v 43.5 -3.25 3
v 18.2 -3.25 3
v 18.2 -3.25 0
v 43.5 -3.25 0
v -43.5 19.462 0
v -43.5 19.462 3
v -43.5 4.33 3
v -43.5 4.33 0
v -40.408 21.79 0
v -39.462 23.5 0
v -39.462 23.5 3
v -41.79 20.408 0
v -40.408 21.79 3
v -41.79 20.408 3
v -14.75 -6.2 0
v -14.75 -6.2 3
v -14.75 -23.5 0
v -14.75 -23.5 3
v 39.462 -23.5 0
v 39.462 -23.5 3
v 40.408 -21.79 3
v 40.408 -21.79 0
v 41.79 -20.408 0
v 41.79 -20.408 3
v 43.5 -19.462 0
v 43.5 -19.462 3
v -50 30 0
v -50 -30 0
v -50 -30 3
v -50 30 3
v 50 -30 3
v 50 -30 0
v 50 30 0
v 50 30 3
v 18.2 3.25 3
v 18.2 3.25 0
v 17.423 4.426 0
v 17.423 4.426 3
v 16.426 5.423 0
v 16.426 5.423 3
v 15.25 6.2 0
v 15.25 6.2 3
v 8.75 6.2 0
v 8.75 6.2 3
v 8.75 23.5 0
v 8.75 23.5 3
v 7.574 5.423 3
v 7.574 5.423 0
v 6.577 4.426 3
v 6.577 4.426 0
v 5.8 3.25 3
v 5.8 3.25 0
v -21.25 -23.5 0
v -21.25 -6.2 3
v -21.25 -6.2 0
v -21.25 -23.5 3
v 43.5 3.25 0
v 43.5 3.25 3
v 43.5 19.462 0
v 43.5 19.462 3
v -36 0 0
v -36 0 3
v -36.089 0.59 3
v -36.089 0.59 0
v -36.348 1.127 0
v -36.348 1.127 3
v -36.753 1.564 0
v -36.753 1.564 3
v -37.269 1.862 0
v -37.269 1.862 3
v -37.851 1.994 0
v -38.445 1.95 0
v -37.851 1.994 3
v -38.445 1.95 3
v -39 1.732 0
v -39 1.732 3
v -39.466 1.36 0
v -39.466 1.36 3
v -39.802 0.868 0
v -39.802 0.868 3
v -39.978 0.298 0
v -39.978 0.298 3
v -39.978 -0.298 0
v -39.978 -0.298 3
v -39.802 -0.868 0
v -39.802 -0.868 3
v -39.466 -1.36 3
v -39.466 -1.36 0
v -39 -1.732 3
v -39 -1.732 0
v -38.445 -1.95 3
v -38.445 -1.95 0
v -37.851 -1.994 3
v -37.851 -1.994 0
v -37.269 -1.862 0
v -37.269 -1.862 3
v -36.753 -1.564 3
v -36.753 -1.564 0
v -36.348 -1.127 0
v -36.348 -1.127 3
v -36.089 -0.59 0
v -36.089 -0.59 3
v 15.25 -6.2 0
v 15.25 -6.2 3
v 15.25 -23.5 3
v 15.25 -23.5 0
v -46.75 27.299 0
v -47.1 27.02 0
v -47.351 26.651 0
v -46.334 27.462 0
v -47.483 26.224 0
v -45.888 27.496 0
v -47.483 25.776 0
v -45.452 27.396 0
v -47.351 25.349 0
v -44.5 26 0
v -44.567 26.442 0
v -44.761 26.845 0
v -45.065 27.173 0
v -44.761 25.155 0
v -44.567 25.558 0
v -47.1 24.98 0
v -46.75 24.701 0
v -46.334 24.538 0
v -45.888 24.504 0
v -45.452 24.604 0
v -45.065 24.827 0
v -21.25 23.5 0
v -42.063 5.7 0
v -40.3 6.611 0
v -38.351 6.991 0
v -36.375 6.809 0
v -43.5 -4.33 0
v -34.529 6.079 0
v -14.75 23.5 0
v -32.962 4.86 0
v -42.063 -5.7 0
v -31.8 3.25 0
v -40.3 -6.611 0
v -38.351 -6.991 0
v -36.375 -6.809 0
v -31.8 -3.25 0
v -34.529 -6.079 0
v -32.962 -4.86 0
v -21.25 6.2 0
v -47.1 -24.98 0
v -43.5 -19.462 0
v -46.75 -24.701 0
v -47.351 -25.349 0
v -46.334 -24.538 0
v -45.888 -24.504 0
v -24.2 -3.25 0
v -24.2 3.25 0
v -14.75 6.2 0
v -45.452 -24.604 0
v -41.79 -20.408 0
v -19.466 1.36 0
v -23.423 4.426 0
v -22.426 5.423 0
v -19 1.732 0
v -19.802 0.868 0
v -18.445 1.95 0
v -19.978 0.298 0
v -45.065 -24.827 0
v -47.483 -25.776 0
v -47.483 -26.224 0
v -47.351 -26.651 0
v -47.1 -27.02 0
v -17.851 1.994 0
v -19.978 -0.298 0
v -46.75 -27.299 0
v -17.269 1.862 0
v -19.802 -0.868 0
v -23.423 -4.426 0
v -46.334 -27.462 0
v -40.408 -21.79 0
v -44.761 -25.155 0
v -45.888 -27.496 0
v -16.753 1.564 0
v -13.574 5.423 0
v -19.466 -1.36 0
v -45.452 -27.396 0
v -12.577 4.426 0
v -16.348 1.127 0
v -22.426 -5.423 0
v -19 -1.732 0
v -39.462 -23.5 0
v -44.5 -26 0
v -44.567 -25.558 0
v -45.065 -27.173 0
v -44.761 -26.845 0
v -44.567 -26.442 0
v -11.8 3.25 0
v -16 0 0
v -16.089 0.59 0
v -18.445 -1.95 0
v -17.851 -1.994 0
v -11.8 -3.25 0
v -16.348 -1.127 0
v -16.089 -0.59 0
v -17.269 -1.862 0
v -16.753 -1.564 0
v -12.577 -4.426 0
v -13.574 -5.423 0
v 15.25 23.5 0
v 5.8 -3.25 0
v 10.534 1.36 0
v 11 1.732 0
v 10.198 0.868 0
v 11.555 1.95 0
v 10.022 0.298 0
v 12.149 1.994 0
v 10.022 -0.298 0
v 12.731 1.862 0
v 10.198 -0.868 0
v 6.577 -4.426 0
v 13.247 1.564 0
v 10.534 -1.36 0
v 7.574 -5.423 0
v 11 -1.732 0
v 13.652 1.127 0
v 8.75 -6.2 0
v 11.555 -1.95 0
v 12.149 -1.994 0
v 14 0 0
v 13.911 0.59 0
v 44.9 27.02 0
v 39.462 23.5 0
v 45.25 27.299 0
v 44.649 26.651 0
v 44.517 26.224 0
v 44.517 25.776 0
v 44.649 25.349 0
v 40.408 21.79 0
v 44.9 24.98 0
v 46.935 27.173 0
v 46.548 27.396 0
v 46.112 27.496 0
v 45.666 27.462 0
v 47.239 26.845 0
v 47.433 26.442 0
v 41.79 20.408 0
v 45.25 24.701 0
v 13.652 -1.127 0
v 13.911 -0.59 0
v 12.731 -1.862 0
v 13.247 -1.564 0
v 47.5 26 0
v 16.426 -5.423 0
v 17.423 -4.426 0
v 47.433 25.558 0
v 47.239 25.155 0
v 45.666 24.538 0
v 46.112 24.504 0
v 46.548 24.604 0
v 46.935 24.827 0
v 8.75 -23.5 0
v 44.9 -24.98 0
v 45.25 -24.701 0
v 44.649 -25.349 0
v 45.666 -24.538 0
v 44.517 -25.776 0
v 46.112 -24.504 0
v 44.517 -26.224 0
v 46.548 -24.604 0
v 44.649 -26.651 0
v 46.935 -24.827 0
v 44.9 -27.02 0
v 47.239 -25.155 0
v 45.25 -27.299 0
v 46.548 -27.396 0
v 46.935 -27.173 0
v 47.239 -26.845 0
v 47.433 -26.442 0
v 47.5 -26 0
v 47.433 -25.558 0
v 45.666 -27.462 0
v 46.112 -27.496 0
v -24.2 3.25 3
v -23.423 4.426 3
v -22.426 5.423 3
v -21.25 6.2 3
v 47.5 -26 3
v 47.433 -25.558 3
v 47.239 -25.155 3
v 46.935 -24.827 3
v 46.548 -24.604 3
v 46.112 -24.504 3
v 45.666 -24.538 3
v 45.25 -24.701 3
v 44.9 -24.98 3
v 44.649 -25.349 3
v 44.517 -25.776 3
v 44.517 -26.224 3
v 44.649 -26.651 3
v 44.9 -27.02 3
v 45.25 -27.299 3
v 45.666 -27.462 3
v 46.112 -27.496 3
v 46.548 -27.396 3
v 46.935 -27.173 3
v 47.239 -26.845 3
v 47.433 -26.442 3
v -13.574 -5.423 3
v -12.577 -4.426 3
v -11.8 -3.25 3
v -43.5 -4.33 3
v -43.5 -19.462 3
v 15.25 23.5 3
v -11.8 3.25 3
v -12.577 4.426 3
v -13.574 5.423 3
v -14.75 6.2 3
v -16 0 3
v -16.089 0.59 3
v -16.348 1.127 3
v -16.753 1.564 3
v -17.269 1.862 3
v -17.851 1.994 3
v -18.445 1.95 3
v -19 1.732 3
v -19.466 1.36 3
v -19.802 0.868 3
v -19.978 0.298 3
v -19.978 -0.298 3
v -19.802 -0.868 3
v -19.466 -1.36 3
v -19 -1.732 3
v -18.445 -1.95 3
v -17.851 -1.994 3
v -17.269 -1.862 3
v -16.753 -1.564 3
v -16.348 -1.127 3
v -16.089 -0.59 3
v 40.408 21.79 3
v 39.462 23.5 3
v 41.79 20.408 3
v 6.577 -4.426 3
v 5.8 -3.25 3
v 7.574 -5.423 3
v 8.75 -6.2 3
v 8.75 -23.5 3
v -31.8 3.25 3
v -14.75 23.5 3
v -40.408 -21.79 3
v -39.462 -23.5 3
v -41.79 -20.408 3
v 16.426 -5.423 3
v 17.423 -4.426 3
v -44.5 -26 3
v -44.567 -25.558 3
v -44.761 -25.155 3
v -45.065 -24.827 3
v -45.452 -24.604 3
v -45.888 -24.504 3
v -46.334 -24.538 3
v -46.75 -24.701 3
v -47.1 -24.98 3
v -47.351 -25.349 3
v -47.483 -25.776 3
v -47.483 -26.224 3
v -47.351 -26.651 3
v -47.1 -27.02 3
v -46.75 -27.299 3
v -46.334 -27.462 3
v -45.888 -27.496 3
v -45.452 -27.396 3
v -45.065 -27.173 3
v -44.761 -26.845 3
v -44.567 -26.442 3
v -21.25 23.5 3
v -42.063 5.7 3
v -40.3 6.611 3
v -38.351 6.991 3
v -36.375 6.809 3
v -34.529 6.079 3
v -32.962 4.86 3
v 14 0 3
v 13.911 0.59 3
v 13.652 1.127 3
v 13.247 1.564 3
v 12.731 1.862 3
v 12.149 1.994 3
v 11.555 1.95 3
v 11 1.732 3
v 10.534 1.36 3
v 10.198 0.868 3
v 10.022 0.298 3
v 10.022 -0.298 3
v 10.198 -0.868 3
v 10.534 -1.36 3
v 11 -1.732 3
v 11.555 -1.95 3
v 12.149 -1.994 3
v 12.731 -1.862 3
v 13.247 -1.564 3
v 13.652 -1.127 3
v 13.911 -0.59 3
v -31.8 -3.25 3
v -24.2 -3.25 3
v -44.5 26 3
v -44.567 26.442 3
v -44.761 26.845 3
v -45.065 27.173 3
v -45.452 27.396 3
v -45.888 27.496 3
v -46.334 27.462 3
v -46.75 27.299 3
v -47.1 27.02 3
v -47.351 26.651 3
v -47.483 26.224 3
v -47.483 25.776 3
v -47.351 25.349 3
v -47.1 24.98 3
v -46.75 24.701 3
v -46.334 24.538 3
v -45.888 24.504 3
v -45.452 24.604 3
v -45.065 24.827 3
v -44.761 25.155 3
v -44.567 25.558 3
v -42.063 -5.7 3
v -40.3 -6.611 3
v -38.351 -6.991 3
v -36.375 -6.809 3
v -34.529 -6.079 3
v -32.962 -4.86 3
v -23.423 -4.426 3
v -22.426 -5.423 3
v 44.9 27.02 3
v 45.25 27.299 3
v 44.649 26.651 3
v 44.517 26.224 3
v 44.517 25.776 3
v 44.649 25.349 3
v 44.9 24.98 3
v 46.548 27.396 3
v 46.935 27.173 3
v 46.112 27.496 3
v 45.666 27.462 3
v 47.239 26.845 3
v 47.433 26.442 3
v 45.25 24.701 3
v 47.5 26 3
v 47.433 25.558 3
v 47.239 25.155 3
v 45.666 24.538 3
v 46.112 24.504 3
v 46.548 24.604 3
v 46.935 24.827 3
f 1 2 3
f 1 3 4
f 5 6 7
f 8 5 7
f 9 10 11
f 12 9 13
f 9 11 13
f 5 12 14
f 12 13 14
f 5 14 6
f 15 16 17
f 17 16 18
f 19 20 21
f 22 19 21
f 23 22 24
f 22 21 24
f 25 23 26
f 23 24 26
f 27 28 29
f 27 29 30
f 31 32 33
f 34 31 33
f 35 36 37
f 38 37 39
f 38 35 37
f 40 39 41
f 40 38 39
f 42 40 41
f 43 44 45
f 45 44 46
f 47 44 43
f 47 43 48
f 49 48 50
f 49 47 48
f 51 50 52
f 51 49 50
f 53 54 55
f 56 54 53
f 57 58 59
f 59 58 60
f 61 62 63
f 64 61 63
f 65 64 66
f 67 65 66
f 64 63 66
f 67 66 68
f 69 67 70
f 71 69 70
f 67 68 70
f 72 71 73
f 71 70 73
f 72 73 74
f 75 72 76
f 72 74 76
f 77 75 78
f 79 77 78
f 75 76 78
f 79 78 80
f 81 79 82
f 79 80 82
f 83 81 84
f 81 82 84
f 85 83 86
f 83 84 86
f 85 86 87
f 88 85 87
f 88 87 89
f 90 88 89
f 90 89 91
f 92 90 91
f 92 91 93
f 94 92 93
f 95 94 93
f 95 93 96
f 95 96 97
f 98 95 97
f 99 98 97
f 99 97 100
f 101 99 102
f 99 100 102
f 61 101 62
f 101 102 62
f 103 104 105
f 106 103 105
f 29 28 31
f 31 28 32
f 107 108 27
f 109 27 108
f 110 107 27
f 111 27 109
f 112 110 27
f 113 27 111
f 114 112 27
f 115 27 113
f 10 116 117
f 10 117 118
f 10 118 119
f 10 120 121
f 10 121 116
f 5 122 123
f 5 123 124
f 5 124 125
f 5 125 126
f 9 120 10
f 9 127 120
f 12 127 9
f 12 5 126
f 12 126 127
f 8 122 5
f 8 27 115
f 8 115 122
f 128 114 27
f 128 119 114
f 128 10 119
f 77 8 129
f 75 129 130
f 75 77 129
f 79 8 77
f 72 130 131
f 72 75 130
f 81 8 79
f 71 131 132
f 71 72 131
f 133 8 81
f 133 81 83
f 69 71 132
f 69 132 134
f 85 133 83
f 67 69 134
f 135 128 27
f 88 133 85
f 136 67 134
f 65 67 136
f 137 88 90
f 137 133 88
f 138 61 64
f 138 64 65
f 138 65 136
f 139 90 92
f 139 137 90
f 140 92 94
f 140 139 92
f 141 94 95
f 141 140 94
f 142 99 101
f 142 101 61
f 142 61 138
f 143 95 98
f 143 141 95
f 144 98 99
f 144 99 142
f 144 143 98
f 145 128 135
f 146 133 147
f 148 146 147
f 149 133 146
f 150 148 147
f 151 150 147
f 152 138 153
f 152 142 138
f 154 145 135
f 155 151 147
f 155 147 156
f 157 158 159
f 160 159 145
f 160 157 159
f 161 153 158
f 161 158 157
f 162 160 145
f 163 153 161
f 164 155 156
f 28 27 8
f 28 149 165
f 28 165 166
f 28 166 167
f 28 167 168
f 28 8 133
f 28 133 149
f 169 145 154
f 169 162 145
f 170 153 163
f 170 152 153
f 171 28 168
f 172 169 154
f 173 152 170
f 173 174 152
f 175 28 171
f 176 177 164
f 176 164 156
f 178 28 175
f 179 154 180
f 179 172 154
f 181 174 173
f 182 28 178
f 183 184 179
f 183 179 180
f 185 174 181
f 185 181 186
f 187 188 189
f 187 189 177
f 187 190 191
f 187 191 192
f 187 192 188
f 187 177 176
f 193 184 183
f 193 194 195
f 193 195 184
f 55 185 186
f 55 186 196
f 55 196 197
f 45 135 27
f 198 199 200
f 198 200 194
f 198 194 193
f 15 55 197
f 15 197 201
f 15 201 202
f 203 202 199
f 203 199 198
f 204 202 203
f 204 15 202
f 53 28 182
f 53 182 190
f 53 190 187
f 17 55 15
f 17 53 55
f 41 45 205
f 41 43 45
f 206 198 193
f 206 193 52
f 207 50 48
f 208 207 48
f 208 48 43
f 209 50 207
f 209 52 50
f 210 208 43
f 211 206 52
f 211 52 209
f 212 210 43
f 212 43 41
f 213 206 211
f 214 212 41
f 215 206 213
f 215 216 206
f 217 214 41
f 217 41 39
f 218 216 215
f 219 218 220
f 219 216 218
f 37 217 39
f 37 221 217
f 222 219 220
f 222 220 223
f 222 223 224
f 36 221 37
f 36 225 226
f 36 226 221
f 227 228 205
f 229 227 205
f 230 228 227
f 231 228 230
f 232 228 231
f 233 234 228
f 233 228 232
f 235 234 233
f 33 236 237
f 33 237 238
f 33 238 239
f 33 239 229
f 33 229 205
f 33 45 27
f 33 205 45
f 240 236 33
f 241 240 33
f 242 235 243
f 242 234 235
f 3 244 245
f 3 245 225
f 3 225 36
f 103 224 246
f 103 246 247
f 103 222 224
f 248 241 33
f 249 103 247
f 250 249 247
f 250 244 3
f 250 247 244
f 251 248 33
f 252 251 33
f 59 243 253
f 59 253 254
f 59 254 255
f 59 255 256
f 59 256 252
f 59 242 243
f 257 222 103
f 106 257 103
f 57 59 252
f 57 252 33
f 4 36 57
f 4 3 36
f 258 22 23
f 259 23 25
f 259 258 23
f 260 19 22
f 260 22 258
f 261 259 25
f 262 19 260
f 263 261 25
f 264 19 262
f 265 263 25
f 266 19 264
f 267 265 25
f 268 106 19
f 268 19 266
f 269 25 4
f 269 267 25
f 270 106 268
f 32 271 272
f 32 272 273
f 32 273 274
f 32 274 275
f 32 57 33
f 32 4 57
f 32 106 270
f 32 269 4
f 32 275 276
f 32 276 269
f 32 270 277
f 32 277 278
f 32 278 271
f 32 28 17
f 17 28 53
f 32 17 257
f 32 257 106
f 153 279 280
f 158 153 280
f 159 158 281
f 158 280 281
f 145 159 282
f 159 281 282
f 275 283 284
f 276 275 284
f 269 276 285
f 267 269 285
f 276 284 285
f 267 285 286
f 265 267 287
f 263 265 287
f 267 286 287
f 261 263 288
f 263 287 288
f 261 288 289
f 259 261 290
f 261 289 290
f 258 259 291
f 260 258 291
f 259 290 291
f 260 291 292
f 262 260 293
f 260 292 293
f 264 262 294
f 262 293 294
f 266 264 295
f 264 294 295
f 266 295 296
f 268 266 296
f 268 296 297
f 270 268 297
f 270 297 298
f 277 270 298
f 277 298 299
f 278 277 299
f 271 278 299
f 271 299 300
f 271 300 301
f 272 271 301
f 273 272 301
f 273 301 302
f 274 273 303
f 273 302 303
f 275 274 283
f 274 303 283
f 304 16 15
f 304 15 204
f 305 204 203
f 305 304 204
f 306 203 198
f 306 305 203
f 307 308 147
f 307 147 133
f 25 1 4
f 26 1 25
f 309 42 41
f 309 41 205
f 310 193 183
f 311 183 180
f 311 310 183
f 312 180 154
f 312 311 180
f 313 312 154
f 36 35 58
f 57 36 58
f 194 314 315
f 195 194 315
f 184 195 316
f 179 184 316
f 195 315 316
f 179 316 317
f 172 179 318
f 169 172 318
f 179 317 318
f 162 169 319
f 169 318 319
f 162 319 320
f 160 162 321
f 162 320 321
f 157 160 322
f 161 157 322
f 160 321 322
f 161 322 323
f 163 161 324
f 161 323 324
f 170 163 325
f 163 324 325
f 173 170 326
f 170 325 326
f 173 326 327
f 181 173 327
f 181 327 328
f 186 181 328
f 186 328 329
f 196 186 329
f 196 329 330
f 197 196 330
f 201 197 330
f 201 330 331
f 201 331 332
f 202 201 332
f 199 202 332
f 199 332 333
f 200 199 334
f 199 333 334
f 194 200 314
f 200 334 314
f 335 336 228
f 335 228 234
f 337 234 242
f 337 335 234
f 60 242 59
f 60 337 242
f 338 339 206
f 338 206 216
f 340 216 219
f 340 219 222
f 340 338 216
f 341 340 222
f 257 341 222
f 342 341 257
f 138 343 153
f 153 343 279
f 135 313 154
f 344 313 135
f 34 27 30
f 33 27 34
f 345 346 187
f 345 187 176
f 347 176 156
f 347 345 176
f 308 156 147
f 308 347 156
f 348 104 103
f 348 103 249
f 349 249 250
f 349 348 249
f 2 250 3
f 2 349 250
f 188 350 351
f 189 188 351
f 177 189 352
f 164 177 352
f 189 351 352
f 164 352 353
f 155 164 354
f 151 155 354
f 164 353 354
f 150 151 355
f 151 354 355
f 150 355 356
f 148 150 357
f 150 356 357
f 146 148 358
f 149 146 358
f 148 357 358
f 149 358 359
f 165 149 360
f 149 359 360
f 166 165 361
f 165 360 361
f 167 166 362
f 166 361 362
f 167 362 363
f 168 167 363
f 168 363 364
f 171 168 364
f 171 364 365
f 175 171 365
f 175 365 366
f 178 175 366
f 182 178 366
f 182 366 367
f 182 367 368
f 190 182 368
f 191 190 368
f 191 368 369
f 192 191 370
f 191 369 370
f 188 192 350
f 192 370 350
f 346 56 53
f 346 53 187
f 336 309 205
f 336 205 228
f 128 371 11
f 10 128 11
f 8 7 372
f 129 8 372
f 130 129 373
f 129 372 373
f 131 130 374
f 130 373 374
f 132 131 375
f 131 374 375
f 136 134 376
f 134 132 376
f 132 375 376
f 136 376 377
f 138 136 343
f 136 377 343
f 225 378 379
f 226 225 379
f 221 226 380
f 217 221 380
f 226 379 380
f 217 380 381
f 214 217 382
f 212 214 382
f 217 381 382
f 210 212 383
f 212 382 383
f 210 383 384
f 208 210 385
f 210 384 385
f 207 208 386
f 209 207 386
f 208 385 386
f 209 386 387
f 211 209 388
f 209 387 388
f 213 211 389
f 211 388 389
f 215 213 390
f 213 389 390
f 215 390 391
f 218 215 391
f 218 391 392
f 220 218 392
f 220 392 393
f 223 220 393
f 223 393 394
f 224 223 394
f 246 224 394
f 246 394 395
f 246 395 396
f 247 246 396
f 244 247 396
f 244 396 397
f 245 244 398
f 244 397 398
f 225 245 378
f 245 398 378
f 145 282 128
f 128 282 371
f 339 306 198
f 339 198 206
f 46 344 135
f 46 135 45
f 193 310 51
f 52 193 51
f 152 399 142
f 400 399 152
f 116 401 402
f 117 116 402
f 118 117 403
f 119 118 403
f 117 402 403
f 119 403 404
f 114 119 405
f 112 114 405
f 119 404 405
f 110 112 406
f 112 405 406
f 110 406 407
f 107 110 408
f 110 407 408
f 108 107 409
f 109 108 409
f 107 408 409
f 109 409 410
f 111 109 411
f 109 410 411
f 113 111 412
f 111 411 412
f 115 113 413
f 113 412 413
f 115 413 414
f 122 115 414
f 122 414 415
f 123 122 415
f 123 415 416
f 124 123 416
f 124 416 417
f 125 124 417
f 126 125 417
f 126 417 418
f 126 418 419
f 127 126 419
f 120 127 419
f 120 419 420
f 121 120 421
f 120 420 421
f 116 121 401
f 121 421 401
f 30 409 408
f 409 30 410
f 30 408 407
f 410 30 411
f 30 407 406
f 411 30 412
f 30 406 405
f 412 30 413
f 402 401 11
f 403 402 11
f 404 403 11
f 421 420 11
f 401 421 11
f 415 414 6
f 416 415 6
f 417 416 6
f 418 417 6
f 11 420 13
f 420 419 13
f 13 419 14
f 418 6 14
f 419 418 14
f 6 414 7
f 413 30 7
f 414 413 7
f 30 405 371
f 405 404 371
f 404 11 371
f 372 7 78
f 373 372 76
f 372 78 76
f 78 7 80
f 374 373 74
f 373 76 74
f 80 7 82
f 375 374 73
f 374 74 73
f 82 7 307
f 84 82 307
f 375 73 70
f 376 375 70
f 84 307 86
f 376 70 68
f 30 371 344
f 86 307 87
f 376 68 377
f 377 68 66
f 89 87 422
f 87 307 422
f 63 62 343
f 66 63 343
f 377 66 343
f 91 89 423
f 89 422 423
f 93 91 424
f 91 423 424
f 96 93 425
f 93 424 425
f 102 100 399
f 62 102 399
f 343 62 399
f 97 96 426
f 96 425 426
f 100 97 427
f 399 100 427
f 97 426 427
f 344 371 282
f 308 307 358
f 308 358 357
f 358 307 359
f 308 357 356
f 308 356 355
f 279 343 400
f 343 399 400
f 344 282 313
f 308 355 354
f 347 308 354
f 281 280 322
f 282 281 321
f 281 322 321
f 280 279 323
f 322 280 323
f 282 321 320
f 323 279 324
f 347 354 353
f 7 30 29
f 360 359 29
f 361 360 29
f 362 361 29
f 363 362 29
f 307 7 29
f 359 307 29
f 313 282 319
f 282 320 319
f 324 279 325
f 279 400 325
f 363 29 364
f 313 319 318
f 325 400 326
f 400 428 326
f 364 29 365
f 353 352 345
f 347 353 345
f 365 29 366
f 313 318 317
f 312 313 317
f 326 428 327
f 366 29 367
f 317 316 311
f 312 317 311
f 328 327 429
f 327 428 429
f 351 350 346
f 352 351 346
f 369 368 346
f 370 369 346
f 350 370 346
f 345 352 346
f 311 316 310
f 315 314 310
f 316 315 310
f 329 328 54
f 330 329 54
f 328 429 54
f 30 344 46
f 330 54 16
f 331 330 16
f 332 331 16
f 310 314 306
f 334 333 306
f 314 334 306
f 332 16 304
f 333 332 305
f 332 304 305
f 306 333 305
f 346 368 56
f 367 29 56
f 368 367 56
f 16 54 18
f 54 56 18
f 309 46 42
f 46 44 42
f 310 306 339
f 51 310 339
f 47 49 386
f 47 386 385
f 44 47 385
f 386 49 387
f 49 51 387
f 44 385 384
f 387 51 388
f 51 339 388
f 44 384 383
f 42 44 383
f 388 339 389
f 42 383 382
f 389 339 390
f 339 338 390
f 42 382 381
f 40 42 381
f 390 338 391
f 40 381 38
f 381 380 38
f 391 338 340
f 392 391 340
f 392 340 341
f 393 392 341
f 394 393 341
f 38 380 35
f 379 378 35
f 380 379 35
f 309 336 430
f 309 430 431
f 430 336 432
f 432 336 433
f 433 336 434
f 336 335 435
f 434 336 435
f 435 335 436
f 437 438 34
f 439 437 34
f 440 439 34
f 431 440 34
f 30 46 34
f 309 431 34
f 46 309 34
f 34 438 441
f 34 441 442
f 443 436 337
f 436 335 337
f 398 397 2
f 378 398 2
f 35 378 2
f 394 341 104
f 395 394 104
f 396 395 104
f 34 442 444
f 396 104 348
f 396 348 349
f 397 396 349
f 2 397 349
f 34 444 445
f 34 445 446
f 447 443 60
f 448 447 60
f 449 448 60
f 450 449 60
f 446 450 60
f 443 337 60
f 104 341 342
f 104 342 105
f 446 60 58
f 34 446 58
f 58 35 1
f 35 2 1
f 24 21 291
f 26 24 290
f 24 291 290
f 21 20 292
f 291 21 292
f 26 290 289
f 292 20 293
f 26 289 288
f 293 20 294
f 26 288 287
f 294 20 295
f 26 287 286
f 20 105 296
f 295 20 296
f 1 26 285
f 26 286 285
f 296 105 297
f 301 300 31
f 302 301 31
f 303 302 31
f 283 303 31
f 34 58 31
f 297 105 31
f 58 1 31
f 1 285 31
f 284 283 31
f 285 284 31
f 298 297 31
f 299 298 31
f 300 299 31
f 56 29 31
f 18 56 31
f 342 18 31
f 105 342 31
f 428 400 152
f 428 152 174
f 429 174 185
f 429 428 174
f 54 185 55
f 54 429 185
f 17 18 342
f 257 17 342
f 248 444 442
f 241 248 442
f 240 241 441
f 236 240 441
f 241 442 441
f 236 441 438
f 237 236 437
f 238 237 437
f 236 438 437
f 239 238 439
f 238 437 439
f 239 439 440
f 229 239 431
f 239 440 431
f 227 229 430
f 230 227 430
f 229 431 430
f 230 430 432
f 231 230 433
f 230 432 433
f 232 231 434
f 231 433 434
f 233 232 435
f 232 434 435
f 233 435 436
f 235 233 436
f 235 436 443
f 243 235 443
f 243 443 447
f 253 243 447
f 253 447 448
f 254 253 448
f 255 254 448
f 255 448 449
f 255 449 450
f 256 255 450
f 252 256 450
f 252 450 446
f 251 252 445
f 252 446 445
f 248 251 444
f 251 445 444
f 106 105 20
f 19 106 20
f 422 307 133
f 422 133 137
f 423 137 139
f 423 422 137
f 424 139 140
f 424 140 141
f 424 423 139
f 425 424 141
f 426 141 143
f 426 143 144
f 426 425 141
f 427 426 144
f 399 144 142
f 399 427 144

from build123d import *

# Parameters (mm, degrees)
SKETCH1_W           = 100
SKETCH1_H           = 60
BOSS_EXTRUDE1_DEPTH = 3
SKETCH2_R           = 2
SKETCH2_R_2         = 1.5
CUT_EXTRUDE1_DEPTH  = 3
SKETCH3_W           = 23.5
SKETCH3_H           = 20.25
CUT_EXTRUDE2_DEPTH  = 10
CUT_EXTRUDE3_DEPTH  = 10
SKETCH5_W           = 28.25
SKETCH5_H           = 20.25
CUT_EXTRUDE4_DEPTH  = 10
SKETCH6_R           = 7
BOSS_EXTRUDE2_DEPTH = 3
SKETCH7_R           = 2
CUT_EXTRUDE6_DEPTH  = 3
SKETCH9_R           = 7
SKETCH9_R_2         = 2
BOSS_EXTRUDE3_DEPTH = 3
BOSS_EXTRUDE4_DEPTH = 3


with BuildPart() as part:
    # Sketch1 → Boss-Extrude1 (new body)
    with BuildSketch(Plane.XY):
        Rectangle(SKETCH1_W, SKETCH1_H)
    extrude(amount=BOSS_EXTRUDE1_DEPTH)

    # Sketch2 → Cut-Extrude1 (cut)
    with BuildSketch(Plane.XY.offset(3)):
        with Locations((-38, 0)):
            Circle(SKETCH2_R)
        with Locations((-18, 0)):
            Circle(SKETCH2_R)
        with Locations((12, 0)):
            Circle(SKETCH2_R)
        with Locations((-46, 26)):
            Circle(SKETCH2_R_2)
        with Locations((46, 26)):
            Circle(SKETCH2_R_2)
        with Locations((46, -26)):
            Circle(SKETCH2_R_2)
        with Locations((-46, -26)):
            Circle(SKETCH2_R_2)
    extrude(amount=-CUT_EXTRUDE1_DEPTH, mode=Mode.SUBTRACT)

    # Sketch3 → Cut-Extrude2 (cut)
    with BuildSketch(Plane.XY.offset(3)):
        with Locations((-3, 13.375)):
            Rectangle(SKETCH3_W, SKETCH3_H)
    cut_extrude2 = extrude(amount=-CUT_EXTRUDE2_DEPTH, mode=Mode.SUBTRACT)

    # Mirror1: Cut-Extrude2 across plane
    add(cut_extrude2.mirror(Plane.ZX), mode=Mode.SUBTRACT)

    # Sketch4 → Cut-Extrude3 (cut)
    with BuildSketch(Plane.XY.offset(3)):
        with BuildLine():
            Line((-21.25, 23.5), (-39.461651585, 23.5))
            ThreePointArc((-39.461651585, 23.5), (-41.050252532, 21.050252532), (-43.5, 19.461651585))
            Line((-43.5, 19.461651585), (-43.5, 4.330127019))
            ThreePointArc((-43.5, 4.330127019), (-37.356495502, 6.970358812), (-31.800201616, 3.25))
            Line((-31.800201616, 3.25), (-24.199798384, 3.25))
            ThreePointArc((-24.199798384, 3.25), (-22.949747468, 4.949747468), (-21.25, 6.199798384))
            Line((-21.25, 6.199798384), (-21.25, 23.5))
        make_face()
    cut_extrude3 = extrude(amount=-CUT_EXTRUDE3_DEPTH, mode=Mode.SUBTRACT)

    # Mirror2: Cut-Extrude3 across plane
    add(cut_extrude3.mirror(Plane.ZX), mode=Mode.SUBTRACT)

    # Sketch5 → Cut-Extrude4 (cut)
    with BuildSketch(Plane.XY.offset(3)):
        with Locations((29.375, 13.375)):
            Rectangle(SKETCH5_W, SKETCH5_H)
    cut_extrude4 = extrude(amount=-CUT_EXTRUDE4_DEPTH, mode=Mode.SUBTRACT)

    # Sketch6 → Boss-Extrude2 (add)
    with BuildSketch(Plane.XY.offset(3)):
        with Locations((-18, 0)):
            Circle(SKETCH6_R)
    extrude(amount=-BOSS_EXTRUDE2_DEPTH)

    # Sketch7 → Cut-Extrude6 (cut)
    with BuildSketch(Plane.XY.offset(3)):
        with Locations((-18, 0)):
            Circle(SKETCH7_R)
    extrude(amount=-CUT_EXTRUDE6_DEPTH, mode=Mode.SUBTRACT)

    # Mirror4: Cut-Extrude4 across plane
    add(cut_extrude4.mirror(Plane.ZX), mode=Mode.SUBTRACT)

    # Sketch9 → Boss-Extrude3 (add)
    with BuildSketch(Plane.XY.offset(3)):
        with Locations((12, 0)):
            Circle(SKETCH9_R)
        with Locations((12, 0)):
            Circle(SKETCH9_R_2, mode=Mode.SUBTRACT)
    extrude(amount=-BOSS_EXTRUDE3_DEPTH)

    # Sketch11 → Boss-Extrude4 (add)
    with BuildSketch(Plane.XY.offset(3)):
        with BuildLine():
            Line((43.5, 19.461651585), (43.5, 23.5))
            Line((43.5, 23.5), (39.461651585, 23.5))
            ThreePointArc((39.461651585, 23.5), (41.050252532, 21.050252532), (43.5, 19.461651585))
        make_face()
    boss_extrude4 = extrude(amount=-BOSS_EXTRUDE4_DEPTH)

    # Mirror5: Boss-Extrude4 across plane
    add(boss_extrude4.mirror(Plane.ZX))


solid = part.part
